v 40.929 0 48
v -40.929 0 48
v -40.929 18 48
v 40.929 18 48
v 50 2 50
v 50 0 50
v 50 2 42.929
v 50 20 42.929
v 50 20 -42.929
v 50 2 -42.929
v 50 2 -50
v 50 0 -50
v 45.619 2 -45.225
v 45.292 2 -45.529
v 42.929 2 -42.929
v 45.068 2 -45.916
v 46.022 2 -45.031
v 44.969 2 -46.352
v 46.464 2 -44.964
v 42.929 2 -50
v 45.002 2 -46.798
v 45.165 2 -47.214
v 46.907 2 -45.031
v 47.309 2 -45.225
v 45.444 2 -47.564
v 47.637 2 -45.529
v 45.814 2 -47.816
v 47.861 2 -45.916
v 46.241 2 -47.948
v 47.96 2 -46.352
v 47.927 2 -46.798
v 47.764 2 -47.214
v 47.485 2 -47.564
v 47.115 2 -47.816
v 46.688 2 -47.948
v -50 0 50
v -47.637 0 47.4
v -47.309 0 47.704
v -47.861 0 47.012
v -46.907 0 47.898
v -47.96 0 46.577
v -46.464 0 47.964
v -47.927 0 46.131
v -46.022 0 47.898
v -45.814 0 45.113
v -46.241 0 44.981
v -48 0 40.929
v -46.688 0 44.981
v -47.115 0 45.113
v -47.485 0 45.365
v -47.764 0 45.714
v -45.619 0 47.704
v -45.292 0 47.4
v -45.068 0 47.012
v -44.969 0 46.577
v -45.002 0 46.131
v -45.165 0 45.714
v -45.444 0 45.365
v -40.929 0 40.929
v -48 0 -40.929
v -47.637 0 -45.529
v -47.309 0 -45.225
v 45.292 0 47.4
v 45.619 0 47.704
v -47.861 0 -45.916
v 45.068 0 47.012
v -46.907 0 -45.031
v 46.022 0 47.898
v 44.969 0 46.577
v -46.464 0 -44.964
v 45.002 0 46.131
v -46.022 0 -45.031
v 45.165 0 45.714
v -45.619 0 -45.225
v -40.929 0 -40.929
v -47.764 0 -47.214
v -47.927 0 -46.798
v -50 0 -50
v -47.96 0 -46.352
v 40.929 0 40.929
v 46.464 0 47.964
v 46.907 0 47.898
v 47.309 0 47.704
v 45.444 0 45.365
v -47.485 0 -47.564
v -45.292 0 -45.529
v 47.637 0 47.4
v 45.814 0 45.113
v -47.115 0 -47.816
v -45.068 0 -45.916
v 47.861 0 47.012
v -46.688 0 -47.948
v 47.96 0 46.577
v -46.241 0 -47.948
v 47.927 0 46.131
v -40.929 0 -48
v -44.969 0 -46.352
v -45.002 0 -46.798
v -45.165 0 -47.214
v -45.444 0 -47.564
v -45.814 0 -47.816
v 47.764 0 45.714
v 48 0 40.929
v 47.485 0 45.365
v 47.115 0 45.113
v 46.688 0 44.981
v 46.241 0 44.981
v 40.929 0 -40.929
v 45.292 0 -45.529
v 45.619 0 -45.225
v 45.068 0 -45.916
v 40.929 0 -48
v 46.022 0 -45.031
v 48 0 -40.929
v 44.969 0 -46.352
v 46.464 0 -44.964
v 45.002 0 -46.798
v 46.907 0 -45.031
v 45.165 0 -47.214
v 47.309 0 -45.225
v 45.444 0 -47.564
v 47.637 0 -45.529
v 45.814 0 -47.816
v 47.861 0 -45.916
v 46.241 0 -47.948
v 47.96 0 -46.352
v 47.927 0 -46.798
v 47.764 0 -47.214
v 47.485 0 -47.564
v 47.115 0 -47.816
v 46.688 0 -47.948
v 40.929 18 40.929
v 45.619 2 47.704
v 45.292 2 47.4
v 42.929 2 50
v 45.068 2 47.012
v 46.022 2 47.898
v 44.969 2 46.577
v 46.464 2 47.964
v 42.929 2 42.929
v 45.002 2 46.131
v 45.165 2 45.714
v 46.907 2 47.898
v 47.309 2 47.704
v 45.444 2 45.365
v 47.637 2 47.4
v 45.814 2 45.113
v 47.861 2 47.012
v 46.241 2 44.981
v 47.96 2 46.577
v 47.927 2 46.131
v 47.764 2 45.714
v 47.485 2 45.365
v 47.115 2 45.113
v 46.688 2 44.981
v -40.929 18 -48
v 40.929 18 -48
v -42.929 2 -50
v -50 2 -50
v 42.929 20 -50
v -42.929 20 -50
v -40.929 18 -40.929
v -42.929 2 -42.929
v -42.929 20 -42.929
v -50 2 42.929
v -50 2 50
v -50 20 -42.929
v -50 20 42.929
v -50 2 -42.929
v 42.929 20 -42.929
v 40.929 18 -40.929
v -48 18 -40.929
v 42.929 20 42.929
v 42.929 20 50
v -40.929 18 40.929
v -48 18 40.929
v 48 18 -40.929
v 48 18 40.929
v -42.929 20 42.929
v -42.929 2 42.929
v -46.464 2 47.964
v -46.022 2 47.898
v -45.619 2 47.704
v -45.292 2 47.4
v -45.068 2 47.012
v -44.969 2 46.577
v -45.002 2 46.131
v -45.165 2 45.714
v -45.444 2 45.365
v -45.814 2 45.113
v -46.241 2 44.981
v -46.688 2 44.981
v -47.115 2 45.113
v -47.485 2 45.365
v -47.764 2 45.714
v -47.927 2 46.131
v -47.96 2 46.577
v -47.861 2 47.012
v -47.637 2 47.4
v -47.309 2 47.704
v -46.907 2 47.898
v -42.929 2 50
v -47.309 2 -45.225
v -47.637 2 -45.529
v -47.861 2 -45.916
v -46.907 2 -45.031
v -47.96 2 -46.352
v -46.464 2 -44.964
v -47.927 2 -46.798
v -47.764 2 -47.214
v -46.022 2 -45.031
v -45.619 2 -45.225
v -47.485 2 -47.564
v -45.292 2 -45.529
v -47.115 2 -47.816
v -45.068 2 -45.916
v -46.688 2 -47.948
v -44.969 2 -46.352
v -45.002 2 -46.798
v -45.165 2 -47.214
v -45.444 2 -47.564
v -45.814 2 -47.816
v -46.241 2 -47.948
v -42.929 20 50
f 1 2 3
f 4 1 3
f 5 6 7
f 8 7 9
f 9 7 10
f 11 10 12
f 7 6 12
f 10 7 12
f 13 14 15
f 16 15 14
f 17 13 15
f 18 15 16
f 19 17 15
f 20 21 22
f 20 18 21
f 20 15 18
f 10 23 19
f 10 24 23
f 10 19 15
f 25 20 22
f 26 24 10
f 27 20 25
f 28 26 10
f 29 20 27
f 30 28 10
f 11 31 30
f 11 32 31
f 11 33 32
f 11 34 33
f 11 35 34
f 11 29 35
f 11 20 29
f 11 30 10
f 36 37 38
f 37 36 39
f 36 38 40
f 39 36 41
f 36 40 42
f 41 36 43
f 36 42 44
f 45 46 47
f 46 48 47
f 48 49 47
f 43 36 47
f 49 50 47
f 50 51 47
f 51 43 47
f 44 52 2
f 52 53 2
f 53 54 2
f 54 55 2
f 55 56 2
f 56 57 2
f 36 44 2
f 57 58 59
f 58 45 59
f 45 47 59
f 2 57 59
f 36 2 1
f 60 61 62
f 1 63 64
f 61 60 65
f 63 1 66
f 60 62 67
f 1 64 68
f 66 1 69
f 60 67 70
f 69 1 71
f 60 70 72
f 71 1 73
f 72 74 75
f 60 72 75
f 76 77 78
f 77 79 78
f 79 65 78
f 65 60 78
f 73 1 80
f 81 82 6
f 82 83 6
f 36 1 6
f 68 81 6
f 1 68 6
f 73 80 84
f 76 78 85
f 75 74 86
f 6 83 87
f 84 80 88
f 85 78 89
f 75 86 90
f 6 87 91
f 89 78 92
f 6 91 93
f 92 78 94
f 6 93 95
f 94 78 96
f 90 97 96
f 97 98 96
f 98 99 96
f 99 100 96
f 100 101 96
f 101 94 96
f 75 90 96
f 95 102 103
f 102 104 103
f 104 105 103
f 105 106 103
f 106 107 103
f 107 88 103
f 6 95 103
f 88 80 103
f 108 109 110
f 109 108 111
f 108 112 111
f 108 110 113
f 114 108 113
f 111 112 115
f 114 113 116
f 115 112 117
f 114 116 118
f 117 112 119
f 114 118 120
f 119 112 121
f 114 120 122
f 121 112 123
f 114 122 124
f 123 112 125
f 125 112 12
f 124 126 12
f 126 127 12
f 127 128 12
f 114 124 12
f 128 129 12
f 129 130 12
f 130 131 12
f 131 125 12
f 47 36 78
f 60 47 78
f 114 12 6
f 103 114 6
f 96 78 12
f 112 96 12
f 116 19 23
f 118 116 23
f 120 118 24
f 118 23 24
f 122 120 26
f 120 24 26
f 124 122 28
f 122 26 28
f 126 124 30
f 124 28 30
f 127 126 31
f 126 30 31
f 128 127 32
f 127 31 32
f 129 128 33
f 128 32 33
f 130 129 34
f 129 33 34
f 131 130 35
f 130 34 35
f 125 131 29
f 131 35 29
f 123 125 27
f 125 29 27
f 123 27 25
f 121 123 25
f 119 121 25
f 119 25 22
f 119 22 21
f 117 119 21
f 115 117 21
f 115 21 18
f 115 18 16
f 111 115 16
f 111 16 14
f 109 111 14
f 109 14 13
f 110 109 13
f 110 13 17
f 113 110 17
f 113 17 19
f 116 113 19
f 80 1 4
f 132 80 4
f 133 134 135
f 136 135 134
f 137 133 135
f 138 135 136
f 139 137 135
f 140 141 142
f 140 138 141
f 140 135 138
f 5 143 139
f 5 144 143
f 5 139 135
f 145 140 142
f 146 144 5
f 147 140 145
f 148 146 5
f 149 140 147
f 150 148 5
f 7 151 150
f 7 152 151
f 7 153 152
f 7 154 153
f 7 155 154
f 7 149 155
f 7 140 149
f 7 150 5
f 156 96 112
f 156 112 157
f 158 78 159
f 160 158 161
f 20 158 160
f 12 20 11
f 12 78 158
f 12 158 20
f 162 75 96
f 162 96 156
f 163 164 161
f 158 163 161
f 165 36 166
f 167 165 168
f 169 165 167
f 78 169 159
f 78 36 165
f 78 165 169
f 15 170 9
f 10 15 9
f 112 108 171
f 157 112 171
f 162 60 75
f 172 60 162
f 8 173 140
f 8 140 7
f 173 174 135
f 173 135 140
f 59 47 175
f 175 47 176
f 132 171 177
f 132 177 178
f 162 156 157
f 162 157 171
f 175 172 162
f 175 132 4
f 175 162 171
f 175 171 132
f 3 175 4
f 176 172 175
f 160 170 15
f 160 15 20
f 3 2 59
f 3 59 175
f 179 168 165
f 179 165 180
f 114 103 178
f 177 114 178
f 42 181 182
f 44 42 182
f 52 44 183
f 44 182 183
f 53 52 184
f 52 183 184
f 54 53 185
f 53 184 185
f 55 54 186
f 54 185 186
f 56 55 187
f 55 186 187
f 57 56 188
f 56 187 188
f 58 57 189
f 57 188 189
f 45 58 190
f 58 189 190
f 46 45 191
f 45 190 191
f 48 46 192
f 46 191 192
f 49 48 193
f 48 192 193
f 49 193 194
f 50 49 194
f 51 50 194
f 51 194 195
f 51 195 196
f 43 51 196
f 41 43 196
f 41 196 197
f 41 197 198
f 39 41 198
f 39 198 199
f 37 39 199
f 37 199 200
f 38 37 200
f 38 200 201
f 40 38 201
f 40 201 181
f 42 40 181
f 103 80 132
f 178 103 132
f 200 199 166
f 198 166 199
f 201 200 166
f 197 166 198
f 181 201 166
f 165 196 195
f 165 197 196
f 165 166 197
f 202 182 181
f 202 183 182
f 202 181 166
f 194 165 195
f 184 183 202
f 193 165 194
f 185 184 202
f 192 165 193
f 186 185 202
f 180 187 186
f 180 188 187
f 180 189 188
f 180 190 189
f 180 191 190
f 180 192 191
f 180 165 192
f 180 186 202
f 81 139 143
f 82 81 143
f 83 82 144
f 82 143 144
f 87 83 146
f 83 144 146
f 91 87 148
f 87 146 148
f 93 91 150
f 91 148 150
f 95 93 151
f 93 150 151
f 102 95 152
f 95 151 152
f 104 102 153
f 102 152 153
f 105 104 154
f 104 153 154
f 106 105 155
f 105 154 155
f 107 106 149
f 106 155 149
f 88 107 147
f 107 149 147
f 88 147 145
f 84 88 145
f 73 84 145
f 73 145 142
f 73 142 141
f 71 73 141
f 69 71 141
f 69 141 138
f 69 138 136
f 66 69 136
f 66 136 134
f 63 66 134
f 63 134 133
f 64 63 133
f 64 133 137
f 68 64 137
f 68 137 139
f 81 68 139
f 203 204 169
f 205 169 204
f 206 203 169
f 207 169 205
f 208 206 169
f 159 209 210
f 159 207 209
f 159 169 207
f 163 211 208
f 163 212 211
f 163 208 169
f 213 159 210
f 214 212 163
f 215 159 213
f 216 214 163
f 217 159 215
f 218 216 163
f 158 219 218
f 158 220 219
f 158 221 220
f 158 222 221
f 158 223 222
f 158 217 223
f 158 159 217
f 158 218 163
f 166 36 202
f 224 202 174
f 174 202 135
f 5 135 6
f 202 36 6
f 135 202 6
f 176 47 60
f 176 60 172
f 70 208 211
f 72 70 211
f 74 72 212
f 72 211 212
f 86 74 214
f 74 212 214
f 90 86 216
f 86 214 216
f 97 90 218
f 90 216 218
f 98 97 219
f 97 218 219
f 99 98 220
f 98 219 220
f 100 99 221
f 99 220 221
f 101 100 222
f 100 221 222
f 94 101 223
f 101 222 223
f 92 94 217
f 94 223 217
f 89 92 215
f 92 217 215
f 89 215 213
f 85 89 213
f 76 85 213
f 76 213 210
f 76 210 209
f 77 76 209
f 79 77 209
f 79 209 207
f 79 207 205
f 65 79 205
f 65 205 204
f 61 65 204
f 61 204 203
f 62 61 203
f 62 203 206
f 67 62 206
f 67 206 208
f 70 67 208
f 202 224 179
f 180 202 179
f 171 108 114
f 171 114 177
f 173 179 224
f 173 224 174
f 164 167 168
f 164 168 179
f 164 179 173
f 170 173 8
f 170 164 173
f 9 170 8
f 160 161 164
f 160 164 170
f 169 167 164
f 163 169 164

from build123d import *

# Parameters (mm, degrees)
CROQUIS1_W              = 100
CROQUIS1_H              = 100
SALIENTE_EXTRUIR1_DEPTH = 20
CROQUIS2_R              = 1.5
CORTAR_EXTRUIR1_DEPTH   = 28
CROQUIS3_W              = 7.071067812
CROQUIS3_H              = 7.071067812
CORTAR_EXTRUIR2_DEPTH   = 18
VACIADO1_START          = -48
VACIADO1_OUTLINE_W      = 18
VACIADO1_OUTLINE_H      = 81.857864376
VACIADO1_DEPTH          = 96
VACIADO1_START_2        = -40.928932188
VACIADO1_2_OUTLINE_W    = 18
VACIADO1_2_OUTLINE_H    = 7.071067812
VACIADO1_2_DEPTH        = 81.857864376


# Read off the part's stored shape, not the designer's step: Vaciado1
with BuildPart() as part:
    # Croquis1 → Saliente-Extruir1 (new body)
    with BuildSketch(Plane(origin=(0, 0, 0), x_dir=(1, 0, 0), z_dir=(0, 1, 0))):
        Rectangle(CROQUIS1_W, CROQUIS1_H)
    extrude(amount=SALIENTE_EXTRUIR1_DEPTH)

    # Croquis2 → Cortar-Extruir1 (cut)
    with BuildSketch(Plane(origin=(0, 20, 0), x_dir=(1, 0, 0), z_dir=(0, 1, 0))):
        with Locations(Location((-46.464466094, -46.464466094, 0), (0, 0, 270))):
            Circle(CROQUIS2_R)
        with Locations(Location((-46.464466094, 46.464466094, 0), (0, 0, 270))):
            Circle(CROQUIS2_R)
        with Locations(Location((46.464466094, 46.464466094, 0), (0, 0, 270))):
            Circle(CROQUIS2_R)
        with Locations(Location((46.464466094, -46.464466094, 0), (0, 0, 270))):
            Circle(CROQUIS2_R)
    extrude(amount=-CORTAR_EXTRUIR1_DEPTH, mode=Mode.SUBTRACT)

    # Croquis3 → Cortar-Extruir2 (cut)
    with BuildSketch(Plane(origin=(0, 20, 0), x_dir=(1, 0, 0), z_dir=(0, 1, 0))):
        with Locations((-46.464466094, -46.464466094)):
            Rectangle(CROQUIS3_W, CROQUIS3_H)
        with Locations((-46.464466094, 46.464466094)):
            Rectangle(CROQUIS3_W, CROQUIS3_H)
        with Locations((46.464466094, 46.464466094)):
            Rectangle(CROQUIS3_W, CROQUIS3_H)
        with Locations((46.464466094, -46.464466094)):
            Rectangle(CROQUIS3_W, CROQUIS3_H)
    extrude(amount=-CORTAR_EXTRUIR2_DEPTH, mode=Mode.SUBTRACT)

    # Vaciado1 outline → Vaciado1 (cut)
    with BuildSketch(Plane.YZ.offset(VACIADO1_START)):
        with Locations((9, 0)):
            Rectangle(VACIADO1_OUTLINE_W, VACIADO1_OUTLINE_H)
    extrude(amount=VACIADO1_DEPTH, mode=Mode.SUBTRACT)

    # Vaciado1 2 outline → Vaciado1 2 (cut)
    with BuildSketch(Plane.YZ.offset(VACIADO1_START_2)):
        with Locations((9, -44.464466094)):
            Rectangle(VACIADO1_2_OUTLINE_W, VACIADO1_2_OUTLINE_H)
        with Locations((9, 44.464466094)):
            Rectangle(VACIADO1_2_OUTLINE_W, VACIADO1_2_OUTLINE_H)
    extrude(amount=VACIADO1_2_DEPTH, mode=Mode.SUBTRACT)


solid = part.part
